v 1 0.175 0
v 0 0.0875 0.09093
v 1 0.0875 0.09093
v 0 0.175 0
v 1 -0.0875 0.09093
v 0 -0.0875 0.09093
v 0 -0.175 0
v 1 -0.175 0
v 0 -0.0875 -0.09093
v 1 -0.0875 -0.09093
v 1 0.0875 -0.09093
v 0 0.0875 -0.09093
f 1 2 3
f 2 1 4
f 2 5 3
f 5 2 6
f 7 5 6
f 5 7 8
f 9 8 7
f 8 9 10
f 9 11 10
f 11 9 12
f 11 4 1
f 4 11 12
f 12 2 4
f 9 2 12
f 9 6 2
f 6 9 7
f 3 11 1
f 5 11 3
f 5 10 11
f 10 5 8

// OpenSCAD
/*This helper library was originally created by davidIvann and 
can be found in his Parametric Space Truss http://www.thingiverse.com/thing:10642
It allows you to join two points on a plane and add rounded corners
*/
module tube(x1, y1, z1, x2, y2, z2, diameter, faces, thickness_over_width)
{
	
	length = sqrt( pow(x1 - x2, 2) + pow(y1 - y2, 2) + pow(z1 - z2, 2) );
	alpha = ( (y2 - y1 != 0) ? atan( (z2 - z1) / (y2 - y1) ) : 0 );
	beta = 90 - ( (x2 - x1 != 0) ? atan( (z2 - z1) / (x2 - x1) ) :  0 );
	gamma =  ( (x2 - x1 != 0) ? atan( (y2 - y1) / (x2 - x1) ) : ( (y2 - y1 >= 0) ? 90 : -90 ) ) + ( (x2 - x1 >= 0) ? 0 : -180 );
	// echo(Length = length, Alpha = alpha, Beta = beta, Gamma = gamma);	
	translate([x1, y1, z1])
	rotate([ 0, beta, gamma])
		scale([thickness_over_width,1,1])
			rotate([0,0,90]) cylinder(h = length, r = diameter/2, center = false, $fn = faces );
}

module corner(x, y, z, diameter){
	translate([x, y, z])
	sphere( r = diameter/2 );
}
d = 0.35; // tube diameter
f = 6;
t = 0.6;
tube(0,0,0,1,0,0, d,f,t);
